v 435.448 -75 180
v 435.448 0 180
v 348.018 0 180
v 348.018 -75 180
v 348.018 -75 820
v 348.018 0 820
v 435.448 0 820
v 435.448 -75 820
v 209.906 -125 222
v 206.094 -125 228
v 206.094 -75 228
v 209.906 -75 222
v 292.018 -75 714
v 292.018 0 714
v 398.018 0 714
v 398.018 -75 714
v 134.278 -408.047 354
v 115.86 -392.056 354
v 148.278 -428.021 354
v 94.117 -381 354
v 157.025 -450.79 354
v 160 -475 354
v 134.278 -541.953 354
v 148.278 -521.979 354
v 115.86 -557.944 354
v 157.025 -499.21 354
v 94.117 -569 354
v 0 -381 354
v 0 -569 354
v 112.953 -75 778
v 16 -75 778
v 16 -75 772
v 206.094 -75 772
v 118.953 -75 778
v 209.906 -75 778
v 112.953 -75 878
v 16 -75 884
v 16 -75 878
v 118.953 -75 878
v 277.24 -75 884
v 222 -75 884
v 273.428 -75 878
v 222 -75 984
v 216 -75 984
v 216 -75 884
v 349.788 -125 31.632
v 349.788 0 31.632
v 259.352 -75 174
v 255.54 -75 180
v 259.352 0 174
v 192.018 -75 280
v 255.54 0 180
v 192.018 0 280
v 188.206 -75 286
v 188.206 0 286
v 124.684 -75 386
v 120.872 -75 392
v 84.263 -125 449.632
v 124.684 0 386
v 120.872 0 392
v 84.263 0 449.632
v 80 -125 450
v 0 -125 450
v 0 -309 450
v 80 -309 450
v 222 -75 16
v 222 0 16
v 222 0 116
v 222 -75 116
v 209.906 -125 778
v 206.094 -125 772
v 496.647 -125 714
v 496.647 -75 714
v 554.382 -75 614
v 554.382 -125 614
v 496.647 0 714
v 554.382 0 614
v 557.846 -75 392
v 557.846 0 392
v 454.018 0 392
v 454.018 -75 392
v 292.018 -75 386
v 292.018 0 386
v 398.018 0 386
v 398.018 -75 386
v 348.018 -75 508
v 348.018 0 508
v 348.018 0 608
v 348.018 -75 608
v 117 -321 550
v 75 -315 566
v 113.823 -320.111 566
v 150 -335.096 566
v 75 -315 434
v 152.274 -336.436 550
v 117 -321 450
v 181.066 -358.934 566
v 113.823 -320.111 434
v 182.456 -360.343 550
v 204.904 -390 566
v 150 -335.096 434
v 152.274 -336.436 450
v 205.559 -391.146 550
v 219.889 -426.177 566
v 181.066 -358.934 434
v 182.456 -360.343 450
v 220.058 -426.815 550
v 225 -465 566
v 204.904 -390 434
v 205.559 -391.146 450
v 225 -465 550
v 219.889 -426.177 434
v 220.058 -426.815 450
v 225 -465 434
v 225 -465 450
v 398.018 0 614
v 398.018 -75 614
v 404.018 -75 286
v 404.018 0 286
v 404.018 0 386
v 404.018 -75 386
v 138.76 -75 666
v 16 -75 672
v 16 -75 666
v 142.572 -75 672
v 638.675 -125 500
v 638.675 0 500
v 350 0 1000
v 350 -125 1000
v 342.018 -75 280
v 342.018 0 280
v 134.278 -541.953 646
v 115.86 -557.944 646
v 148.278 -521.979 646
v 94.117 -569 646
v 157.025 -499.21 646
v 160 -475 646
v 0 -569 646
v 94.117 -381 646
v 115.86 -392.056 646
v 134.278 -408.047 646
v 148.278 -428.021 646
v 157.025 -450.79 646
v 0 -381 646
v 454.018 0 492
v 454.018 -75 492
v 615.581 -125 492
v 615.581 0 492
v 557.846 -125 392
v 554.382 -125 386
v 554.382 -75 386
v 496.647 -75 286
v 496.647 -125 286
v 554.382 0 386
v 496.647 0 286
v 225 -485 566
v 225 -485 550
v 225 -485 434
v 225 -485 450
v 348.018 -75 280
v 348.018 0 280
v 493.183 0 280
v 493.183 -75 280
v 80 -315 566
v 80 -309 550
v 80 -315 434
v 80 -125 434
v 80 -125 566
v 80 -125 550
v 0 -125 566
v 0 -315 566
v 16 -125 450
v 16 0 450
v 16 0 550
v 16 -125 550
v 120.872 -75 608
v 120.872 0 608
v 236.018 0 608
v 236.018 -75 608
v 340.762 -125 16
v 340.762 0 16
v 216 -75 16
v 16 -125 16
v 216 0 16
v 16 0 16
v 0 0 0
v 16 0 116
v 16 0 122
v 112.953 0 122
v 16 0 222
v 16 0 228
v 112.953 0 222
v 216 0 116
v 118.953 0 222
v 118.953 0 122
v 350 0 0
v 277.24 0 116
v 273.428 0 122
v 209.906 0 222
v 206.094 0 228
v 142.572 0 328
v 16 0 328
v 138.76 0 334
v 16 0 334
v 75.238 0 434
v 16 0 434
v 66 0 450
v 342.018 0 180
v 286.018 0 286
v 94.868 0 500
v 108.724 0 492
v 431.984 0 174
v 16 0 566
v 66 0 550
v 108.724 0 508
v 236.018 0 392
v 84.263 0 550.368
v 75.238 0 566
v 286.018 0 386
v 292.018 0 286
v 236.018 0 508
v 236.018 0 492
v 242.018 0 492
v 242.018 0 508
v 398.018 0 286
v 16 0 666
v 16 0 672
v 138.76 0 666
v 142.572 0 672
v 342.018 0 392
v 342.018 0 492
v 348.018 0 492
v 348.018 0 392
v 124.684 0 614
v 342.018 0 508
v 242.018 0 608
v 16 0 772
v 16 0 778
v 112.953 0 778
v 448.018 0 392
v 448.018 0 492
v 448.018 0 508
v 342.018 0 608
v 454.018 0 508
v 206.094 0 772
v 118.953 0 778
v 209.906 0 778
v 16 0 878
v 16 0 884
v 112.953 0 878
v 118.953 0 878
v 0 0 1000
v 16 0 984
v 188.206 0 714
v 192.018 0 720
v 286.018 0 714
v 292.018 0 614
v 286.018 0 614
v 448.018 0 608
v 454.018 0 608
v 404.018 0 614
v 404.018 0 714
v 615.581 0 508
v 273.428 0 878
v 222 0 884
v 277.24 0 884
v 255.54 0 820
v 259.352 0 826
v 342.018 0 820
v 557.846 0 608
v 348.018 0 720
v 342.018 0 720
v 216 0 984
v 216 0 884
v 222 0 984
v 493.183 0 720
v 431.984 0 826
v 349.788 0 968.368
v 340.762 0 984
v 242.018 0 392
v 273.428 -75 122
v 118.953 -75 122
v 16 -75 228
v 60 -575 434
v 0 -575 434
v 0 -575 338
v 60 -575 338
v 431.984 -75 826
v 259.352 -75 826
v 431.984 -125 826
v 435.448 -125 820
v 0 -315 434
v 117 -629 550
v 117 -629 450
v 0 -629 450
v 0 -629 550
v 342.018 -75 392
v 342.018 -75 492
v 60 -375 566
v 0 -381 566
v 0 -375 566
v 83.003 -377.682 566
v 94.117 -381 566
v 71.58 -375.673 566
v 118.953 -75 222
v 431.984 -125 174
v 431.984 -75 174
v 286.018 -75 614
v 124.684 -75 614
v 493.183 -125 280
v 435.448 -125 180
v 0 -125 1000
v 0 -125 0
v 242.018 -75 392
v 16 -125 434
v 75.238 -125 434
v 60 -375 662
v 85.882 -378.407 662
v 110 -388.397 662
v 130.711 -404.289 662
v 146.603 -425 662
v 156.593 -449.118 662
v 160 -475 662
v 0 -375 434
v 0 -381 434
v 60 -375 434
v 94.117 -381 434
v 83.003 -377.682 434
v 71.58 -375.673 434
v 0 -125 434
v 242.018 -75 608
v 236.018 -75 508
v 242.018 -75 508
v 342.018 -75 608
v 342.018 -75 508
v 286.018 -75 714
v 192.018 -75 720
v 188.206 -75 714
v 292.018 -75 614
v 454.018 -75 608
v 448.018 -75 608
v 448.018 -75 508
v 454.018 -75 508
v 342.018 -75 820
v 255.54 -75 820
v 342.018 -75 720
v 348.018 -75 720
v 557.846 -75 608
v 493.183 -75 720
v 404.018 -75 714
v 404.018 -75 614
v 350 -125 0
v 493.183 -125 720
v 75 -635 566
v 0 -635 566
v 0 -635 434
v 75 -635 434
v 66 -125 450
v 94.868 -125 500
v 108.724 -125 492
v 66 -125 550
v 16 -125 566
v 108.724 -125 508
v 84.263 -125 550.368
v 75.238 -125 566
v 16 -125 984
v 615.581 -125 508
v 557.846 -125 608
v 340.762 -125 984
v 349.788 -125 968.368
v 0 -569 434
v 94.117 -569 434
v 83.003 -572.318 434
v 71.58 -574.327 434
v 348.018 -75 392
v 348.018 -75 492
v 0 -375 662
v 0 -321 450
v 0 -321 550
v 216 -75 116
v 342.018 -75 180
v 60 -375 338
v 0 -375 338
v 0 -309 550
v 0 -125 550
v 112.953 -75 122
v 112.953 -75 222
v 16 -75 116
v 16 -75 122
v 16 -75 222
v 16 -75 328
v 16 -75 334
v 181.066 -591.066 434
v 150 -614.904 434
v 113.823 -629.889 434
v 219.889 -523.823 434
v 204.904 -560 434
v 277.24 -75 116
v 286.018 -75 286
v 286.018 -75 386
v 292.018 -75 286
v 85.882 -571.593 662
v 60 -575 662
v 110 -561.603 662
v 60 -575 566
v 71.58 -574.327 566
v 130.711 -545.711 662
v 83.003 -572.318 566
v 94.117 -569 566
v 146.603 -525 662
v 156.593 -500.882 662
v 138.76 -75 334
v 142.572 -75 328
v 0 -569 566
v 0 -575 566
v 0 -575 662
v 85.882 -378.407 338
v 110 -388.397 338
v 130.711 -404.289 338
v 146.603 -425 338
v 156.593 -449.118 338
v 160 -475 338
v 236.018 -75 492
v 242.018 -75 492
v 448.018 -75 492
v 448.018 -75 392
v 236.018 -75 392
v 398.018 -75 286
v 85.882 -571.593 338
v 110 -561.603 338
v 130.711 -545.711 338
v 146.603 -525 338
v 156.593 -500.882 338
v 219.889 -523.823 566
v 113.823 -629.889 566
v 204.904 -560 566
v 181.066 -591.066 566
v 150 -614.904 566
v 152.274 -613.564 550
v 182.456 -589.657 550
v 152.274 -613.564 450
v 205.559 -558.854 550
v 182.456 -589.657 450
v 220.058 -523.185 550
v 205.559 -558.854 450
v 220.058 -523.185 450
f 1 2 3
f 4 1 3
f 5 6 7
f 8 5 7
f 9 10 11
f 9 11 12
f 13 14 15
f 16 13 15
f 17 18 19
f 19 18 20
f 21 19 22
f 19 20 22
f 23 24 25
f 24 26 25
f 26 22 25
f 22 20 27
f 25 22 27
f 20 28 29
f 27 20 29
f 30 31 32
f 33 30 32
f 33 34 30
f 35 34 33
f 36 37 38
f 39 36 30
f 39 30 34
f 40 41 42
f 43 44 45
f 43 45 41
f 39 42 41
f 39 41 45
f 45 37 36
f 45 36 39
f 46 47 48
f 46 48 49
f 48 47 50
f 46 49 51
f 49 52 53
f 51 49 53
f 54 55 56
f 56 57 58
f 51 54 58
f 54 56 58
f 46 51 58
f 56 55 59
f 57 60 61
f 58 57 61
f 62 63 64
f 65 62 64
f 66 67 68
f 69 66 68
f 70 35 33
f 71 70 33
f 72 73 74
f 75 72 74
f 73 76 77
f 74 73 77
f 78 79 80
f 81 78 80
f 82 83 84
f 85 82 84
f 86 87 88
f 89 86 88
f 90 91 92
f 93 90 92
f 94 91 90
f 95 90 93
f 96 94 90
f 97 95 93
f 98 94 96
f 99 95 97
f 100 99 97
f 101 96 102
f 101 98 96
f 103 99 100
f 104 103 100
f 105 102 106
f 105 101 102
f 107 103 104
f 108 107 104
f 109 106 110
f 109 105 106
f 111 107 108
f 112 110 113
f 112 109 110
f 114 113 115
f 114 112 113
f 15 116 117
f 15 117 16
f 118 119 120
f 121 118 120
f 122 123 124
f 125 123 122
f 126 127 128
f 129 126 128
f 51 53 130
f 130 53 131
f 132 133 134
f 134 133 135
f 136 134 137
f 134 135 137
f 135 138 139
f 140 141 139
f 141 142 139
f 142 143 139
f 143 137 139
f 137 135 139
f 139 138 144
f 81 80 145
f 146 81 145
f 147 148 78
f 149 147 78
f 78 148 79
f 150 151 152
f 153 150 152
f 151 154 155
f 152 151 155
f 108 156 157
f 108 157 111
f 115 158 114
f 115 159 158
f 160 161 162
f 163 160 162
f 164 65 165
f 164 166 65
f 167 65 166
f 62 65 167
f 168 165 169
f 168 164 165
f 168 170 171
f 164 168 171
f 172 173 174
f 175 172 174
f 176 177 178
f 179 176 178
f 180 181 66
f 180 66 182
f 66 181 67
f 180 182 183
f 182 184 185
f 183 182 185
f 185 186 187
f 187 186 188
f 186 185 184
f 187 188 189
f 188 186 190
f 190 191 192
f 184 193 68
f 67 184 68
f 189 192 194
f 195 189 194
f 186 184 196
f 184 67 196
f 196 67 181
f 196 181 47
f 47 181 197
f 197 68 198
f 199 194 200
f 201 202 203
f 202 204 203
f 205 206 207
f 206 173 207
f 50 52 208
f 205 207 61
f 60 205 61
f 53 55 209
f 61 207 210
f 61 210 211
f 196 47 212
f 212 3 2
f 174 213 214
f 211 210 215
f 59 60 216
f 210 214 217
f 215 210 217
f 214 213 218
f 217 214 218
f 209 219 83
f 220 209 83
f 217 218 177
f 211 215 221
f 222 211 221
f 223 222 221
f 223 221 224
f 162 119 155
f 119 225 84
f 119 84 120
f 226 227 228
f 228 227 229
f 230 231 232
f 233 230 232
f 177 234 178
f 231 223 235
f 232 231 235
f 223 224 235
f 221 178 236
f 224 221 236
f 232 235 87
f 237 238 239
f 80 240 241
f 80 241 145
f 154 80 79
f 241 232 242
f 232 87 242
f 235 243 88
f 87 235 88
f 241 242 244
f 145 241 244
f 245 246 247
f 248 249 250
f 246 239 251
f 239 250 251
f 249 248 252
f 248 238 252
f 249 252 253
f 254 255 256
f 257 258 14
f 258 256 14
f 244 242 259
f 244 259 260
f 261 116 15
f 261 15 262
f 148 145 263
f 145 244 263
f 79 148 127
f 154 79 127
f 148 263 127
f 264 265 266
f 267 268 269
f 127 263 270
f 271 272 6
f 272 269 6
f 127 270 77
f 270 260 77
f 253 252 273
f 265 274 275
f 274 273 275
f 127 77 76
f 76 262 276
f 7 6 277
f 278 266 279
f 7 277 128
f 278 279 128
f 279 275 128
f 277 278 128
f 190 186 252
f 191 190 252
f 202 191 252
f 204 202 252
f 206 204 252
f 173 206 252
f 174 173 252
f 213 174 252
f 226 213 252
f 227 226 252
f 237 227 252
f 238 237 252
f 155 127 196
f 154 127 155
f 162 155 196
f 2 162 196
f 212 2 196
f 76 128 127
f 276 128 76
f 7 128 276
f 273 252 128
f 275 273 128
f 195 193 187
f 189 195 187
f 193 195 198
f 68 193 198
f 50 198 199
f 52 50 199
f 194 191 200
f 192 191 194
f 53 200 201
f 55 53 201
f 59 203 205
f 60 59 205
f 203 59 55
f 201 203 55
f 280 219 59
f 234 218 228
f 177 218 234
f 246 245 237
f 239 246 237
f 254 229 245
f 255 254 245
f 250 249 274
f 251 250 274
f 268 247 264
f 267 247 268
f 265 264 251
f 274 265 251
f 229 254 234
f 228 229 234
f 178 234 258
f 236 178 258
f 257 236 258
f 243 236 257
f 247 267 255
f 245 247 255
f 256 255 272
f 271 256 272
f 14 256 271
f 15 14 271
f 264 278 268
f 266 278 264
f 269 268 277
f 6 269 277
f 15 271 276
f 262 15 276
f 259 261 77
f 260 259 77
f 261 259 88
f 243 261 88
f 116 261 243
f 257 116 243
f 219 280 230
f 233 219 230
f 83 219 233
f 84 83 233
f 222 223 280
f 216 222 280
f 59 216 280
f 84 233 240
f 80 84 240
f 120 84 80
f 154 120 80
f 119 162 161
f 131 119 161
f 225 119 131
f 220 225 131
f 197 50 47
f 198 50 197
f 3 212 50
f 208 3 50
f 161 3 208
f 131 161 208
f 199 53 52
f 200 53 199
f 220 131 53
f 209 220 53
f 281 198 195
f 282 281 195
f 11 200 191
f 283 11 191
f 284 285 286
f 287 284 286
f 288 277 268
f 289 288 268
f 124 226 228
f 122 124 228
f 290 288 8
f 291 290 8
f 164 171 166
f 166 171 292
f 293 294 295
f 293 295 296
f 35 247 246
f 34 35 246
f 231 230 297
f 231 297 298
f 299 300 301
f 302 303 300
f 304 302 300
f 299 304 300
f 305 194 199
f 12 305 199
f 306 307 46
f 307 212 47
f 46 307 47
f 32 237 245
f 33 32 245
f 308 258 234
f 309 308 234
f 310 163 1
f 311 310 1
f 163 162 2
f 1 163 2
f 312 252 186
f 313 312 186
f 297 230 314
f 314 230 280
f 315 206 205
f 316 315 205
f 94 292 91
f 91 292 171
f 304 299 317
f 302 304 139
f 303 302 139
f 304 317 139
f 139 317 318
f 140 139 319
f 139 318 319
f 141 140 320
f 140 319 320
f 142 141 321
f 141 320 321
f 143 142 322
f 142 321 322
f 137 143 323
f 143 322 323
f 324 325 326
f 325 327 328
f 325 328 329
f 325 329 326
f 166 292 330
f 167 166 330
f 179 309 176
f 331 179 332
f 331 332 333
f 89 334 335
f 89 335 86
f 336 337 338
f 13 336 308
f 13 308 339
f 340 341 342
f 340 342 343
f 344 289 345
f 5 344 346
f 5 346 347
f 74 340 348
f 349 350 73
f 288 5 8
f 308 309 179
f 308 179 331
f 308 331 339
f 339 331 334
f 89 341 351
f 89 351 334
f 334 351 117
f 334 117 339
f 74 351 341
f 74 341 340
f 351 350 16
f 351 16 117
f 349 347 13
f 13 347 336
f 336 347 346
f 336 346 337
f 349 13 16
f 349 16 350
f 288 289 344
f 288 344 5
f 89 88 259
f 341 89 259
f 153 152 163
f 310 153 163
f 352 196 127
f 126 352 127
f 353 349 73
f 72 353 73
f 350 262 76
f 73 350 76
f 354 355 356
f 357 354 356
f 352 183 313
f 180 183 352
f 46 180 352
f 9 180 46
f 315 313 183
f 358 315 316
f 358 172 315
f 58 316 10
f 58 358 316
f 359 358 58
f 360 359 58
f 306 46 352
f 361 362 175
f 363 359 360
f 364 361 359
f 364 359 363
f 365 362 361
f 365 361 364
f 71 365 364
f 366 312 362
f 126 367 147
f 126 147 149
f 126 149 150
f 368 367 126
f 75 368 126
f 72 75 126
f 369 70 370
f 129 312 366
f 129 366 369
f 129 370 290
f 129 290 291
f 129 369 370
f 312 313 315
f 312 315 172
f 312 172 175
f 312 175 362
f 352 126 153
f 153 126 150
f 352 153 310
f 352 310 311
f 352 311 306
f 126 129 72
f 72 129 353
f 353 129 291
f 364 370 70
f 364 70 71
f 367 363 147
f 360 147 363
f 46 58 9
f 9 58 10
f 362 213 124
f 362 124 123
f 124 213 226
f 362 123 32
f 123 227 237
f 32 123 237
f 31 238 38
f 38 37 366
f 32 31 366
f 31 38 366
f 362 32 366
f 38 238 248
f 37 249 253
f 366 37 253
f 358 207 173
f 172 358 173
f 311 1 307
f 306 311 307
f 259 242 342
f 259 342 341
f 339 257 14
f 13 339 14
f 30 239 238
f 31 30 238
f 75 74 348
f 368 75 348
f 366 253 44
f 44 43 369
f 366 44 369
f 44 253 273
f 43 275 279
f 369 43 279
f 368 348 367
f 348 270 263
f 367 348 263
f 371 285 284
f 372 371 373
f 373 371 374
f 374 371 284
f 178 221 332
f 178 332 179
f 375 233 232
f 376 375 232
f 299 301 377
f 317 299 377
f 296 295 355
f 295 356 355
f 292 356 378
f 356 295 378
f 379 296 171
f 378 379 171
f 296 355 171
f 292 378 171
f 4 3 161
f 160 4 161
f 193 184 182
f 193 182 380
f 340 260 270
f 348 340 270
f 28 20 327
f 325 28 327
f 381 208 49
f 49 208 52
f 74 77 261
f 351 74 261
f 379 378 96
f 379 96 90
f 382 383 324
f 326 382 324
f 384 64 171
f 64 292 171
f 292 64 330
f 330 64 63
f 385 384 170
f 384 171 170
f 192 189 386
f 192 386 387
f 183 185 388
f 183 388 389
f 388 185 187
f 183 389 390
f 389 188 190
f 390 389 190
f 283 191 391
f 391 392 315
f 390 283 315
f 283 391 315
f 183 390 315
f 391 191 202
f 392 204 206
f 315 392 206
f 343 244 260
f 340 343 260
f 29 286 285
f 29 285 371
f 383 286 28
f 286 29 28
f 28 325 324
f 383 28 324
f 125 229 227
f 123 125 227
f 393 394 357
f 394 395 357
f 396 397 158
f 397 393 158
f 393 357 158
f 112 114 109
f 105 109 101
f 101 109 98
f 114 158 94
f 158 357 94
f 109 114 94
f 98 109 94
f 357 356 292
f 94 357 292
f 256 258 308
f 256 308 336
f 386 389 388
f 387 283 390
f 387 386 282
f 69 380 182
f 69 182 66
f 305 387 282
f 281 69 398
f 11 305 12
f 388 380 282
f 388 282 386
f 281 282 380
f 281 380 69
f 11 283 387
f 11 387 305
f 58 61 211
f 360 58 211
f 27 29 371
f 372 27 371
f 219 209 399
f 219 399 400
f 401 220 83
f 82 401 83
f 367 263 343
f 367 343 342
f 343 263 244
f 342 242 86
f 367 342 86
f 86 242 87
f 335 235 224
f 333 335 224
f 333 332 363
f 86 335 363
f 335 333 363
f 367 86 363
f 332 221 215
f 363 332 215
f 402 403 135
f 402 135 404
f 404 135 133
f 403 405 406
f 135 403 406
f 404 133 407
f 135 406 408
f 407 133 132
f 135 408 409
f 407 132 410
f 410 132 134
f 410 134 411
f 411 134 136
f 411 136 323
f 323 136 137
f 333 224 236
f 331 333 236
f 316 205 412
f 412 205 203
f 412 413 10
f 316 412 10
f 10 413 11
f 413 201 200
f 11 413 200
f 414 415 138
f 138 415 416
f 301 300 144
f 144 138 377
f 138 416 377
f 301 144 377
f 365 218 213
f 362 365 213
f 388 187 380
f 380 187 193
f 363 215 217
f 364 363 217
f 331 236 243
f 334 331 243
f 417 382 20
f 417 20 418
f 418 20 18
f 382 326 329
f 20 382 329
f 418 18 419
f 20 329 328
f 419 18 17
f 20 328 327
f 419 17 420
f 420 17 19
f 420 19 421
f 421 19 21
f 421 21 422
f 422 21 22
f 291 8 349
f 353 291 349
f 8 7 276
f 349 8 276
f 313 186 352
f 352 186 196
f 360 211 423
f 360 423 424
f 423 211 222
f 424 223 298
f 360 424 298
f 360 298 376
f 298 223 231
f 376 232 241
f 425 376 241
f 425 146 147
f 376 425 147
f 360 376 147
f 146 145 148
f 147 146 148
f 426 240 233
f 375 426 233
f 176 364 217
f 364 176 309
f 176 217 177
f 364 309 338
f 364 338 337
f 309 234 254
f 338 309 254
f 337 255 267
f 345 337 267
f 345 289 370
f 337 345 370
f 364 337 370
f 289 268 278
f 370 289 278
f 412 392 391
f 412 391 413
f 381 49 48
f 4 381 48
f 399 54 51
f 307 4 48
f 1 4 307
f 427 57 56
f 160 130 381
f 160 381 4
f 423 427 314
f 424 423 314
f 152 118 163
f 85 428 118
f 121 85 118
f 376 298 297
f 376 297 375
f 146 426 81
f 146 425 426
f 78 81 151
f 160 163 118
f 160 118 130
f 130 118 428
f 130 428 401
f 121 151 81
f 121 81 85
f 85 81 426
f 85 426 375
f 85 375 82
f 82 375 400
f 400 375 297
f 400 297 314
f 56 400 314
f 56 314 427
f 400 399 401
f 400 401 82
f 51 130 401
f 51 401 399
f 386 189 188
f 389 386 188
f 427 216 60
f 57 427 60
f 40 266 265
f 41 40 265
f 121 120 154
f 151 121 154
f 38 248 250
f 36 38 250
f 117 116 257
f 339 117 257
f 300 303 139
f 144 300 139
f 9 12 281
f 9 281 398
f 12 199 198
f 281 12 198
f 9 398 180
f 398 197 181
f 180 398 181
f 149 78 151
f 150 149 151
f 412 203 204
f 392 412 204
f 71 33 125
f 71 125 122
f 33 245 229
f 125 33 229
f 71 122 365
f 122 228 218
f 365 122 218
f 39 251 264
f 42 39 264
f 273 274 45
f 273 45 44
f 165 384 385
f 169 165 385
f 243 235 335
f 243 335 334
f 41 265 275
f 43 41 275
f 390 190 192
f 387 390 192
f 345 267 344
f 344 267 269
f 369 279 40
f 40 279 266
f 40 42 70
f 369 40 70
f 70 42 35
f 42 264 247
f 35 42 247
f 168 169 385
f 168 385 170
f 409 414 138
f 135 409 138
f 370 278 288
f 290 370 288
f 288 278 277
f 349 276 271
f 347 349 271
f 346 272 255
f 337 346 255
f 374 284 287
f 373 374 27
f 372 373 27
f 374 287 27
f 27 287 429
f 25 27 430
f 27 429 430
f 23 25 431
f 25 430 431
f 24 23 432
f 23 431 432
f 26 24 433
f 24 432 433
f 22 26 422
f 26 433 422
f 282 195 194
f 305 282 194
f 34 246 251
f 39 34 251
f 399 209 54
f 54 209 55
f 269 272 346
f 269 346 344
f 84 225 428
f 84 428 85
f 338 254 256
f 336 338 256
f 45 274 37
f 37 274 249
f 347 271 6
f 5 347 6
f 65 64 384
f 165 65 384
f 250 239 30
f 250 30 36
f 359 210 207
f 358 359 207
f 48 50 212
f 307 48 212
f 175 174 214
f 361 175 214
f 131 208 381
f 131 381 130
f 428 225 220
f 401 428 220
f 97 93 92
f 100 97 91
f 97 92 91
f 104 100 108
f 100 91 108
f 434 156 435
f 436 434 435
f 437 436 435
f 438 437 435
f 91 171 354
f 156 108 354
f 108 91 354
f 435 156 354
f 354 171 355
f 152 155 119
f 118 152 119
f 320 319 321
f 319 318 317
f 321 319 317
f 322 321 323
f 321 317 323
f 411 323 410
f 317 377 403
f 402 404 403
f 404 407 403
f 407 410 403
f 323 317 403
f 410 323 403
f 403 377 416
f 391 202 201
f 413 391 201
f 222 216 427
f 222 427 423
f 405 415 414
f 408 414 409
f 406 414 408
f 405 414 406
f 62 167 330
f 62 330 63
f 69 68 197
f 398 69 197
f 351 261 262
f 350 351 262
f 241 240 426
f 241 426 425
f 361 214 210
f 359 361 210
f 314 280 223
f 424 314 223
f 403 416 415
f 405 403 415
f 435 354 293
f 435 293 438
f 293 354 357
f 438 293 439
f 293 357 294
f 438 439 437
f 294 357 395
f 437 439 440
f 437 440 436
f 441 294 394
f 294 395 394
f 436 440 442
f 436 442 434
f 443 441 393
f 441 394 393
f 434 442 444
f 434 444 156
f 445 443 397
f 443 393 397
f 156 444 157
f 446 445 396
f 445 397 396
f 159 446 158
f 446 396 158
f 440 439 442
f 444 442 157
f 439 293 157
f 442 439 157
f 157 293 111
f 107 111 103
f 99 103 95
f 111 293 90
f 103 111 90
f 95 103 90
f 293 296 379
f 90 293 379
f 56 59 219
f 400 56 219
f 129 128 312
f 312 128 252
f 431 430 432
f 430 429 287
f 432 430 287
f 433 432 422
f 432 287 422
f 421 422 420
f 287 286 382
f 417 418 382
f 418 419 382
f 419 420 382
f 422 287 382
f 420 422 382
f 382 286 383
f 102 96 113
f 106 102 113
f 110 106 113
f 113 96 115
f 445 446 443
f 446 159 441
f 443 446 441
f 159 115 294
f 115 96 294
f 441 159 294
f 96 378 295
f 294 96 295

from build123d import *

# Parameters (mm, degrees)
F2_DEPTH    = 125
F1_W        = 6
F1_H        = 100
F3_DEPTH    = 75
F4_W        = 6
F4_H        = 80
F5_DEPTH    = 160
F4_H_2      = 100
F6_DEPTH    = 80
F7_R        = 99.99999
F7_2_R      = 99.99999
F8_DEPTH    = 225
F9_T1_DEPTH = 882


# Not quite as in the source:
# - a fillet or chamfer that OpenCascade refuses, or shapes differently, is made with other operations: its cross-section is extruded or revolved along the edge and cut away or added
# - a fillet or chamfer is up to 0.001 mm smaller than in the source, because OpenCascade refuses the exact size
# - a feature names something its author has since deleted; it is built from what else it names


with BuildPart() as f2:
    # F1 (on Front) → F2 (new body)
    with BuildSketch(Plane.XZ):
        Polygon((0, 1000), (0, 0), (350, 0), (638.6751345948, 500), (350, 1000), align=None)
        Polygon((16, 884), (16, 984), (216, 984), (222, 984), (340.762395693, 984), (349.7876249334, 968.3678444056), (431.9837382249, 826), (435.4478398401, 820), (493.182866759, 720), (496.6469683742, 714), (554.3819952931, 614), (557.8460969083, 608), (615.5811238272, 508), (620.1999259807, 500), (615.5811238272, 492), (557.8460969083, 392), (554.3819952931, 386), (496.6469683742, 286), (493.182866759, 280), (435.4478398401, 180), (431.9837382249, 174), (349.7876249334, 31.6321555944), (340.762395693, 16), (222, 16), (216, 16), (16, 16), (16, 116), (16, 122), (16, 222), (16, 228), (16, 328), (16, 334), (16, 434), (16, 450), (16, 550), (16, 566), (16, 666), (16, 672), (16, 772), (16, 778), (16, 878), align=None, mode=Mode.SUBTRACT)
        Polygon((236.0177204531, 508), (108.72391992, 508), (113.3427220735, 500), (108.72391992, 492), (236.0177204531, 492), (242.0177204531, 492), (342.0177204531, 492), (348.0177204531, 492), (448.0177204531, 492), (454.0177204531, 492), (615.5811238272, 492), (620.1999259807, 500), (615.5811238272, 508), (454.0177204531, 508), (448.0177204531, 508), (348.0177204531, 508), (342.0177204531, 508), (242.0177204531, 508), align=None)
        Polygon((84.2628335475, 449.6321555944), (75.237604307, 434), (138.7602816721, 334), (142.571642314, 328), (206.094319679, 228), (209.905680321, 222), (273.428357686, 122), (277.2397183279, 116), (340.762395693, 16), (349.7876249334, 31.6321555944), (259.3517584601, 174), (255.5403978182, 180), (192.0177204531, 280), (188.2063598112, 286), (124.6836824461, 386), (120.8723218042, 392), align=None)
        Polygon((349.7876249334, 968.3678444056), (340.762395693, 984), (277.2397183279, 884), (273.428357686, 878), (209.905680321, 778), (206.094319679, 772), (142.571642314, 672), (138.7602816721, 666), (75.237604307, 566), (84.2628335475, 550.3678444056), (120.8723218042, 608), (124.6836824461, 614), (188.2063598112, 714), (192.0177204531, 720), (255.5403978182, 820), (259.3517584601, 826), align=None)
        Polygon((75.237604307, 566), (16, 566), (16, 550), (66, 550), (94.8675134595, 500), (66, 450), (16, 450), (16, 434), (75.237604307, 434), (84.2628335475, 449.6321555944), (108.72391992, 492), (113.3427220735, 500), (108.72391992, 508), (84.2628335475, 550.3678444056), align=None)
    extrude(amount=F2_DEPTH)

    # F1 (on Front) → F3 (join)
    with BuildSketch(Plane.XZ):
        Polygon((112.9528401605, 122), (16, 122), (16, 116), (216, 116), (222, 116), (277.2397183279, 116), (273.428357686, 122), (118.9528401605, 122), align=None)
        with Locations((219, 66)):
            Rectangle(F1_W, F1_H)
        with Locations((115.9528401605, 172)):
            Rectangle(F1_W, F1_H)
        Polygon((206.094319679, 228), (16, 228), (16, 222), (112.9528401605, 222), (118.9528401605, 222), (209.905680321, 222), align=None)
        Polygon((138.7602816721, 334), (16, 334), (16, 328), (142.571642314, 328), align=None)
        Polygon((342.0177204531, 180), (255.5403978182, 180), (259.3517584601, 174), (431.9837382249, 174), (435.4478398401, 180), (348.0177204531, 180), align=None)
        with Locations((345.0177204531, 230)):
            Rectangle(F1_W, F1_H)
        Polygon((286.0177204531, 286), (188.2063598112, 286), (192.0177204531, 280), (342.0177204531, 280), (348.0177204531, 280), (493.182866759, 280), (496.6469683742, 286), (404.0177204531, 286), (398.0177204531, 286), (292.0177204531, 286), align=None)
        with Locations((289.0177204531, 336)):
            Rectangle(F1_W, F1_H)
        with Locations((401.0177204531, 336)):
            Rectangle(F1_W, F1_H)
        Polygon((236.0177204531, 392), (120.8723218042, 392), (124.6836824461, 386), (286.0177204531, 386), (292.0177204531, 386), (398.0177204531, 386), (404.0177204531, 386), (554.3819952931, 386), (557.8460969083, 392), (454.0177204531, 392), (448.0177204531, 392), (348.0177204531, 392), (342.0177204531, 392), (242.0177204531, 392), align=None)
        with Locations((345.0177204531, 442)):
            Rectangle(F1_W, F1_H)
        with Locations((239.0177204531, 442)):
            Rectangle(F1_W, F1_H)
        with Locations((451.0177204531, 442)):
            Rectangle(F1_W, F1_H)
        with Locations((401.0177204531, 664)):
            Rectangle(F1_W, F1_H)
        Polygon((496.6469683742, 714), (493.182866759, 720), (348.0177204531, 720), (342.0177204531, 720), (192.0177204531, 720), (188.2063598112, 714), (286.0177204531, 714), (292.0177204531, 714), (398.0177204531, 714), (404.0177204531, 714), align=None)
        with Locations((345.0177204531, 770)):
            Rectangle(F1_W, F1_H)
        Polygon((557.8460969083, 608), (554.3819952931, 614), (404.0177204531, 614), (398.0177204531, 614), (292.0177204531, 614), (286.0177204531, 614), (124.6836824461, 614), (120.8723218042, 608), (236.0177204531, 608), (242.0177204531, 608), (342.0177204531, 608), (348.0177204531, 608), (448.0177204531, 608), (454.0177204531, 608), align=None)
        with Locations((451.0177204531, 558)):
            Rectangle(F1_W, F1_H)
        with Locations((239.0177204531, 558)):
            Rectangle(F1_W, F1_H)
        with Locations((345.0177204531, 558)):
            Rectangle(F1_W, F1_H)
        Polygon((142.571642314, 672), (16, 672), (16, 666), (138.7602816721, 666), align=None)
        Polygon((112.9528401605, 778), (16, 778), (16, 772), (206.094319679, 772), (209.905680321, 778), (118.9528401605, 778), align=None)
        with Locations((115.9528401605, 828)):
            Rectangle(F1_W, F1_H)
        Polygon((216, 884), (16, 884), (16, 878), (112.9528401605, 878), (118.9528401605, 878), (273.428357686, 878), (277.2397183279, 884), (222, 884), align=None)
        with Locations((219, 934)):
            Rectangle(F1_W, F1_H)
        Polygon((435.4478398401, 820), (431.9837382249, 826), (259.3517584601, 826), (255.5403978182, 820), (342.0177204531, 820), (348.0177204531, 820), align=None)
        with Locations((289.0177204531, 664)):
            Rectangle(F1_W, F1_H)
    extrude(amount=F3_DEPTH)


with BuildPart() as f5:
    # F4 (on Right) → F5 (new body)
    with BuildSketch(Plane.YZ):
        Polygon((-381, 646), (-375, 646), (-375, 662), (-575, 662), (-575, 646), (-569, 646), align=None)
        with Locations((-572, 606)):
            Rectangle(F4_W, F4_H)
        with Locations((-378, 606)):
            Rectangle(F4_W, F4_H)
    extrude(amount=F5_DEPTH)

    # F7 (radius 100 in the source; OpenCascade refuses exactly that, so slightly less here)
    f7_edges = [f5.edges().sort_by_distance(p)[0] for p in [
        (160, -375, 614),
        (160, -575, 614),
    ]]
    fillet(f7_edges, radius=F7_R)


with BuildPart() as f5b:
    # F4 (on Right) → F5, piece 2 (new body)
    with BuildSketch(Plane.YZ):
        Polygon((-375, 338), (-375, 354), (-381, 354), (-569, 354), (-575, 354), (-575, 338), align=None)
        with Locations((-378, 394)):
            Rectangle(F4_W, F4_H)
        with Locations((-572, 394)):
            Rectangle(F4_W, F4_H)
    extrude(amount=F5_DEPTH)

    # F7#2 (radius 100 in the source; OpenCascade refuses exactly that, so slightly less here)
    f7_2_edges = [f5b.edges().sort_by_distance(p)[0] for p in [
        (160, -375, 386),
        (160, -575, 386),
    ]]
    fillet(f7_2_edges, radius=F7_2_R)


with BuildPart() as f6:
    # F4 (on Right) → F6 (new body)
    with BuildSketch(Plane.YZ):
        with Locations((-312, 500)):
            Rectangle(F4_W, F4_H_2)
        Polygon((-309, 550), (-125, 550), (-125, 566), (-315, 566), (-315, 550), align=None)
        Polygon((-125, 450), (-309, 450), (-315, 450), (-315, 434), (-125, 434), align=None)
    extrude(amount=F6_DEPTH)


with BuildPart() as f8:
    # F4 (on Right) → F8 (new body)
    with BuildSketch(Plane.YZ):
        Polygon((-321, 550), (-315, 550), (-315, 566), (-375, 566), (-381, 566), (-569, 566), (-575, 566), (-635, 566), (-635, 550), (-629, 550), align=None)
        with Locations((-632, 500)):
            Rectangle(F4_W, F4_H_2)
        Polygon((-315, 434), (-315, 450), (-321, 450), (-629, 450), (-635, 450), (-635, 434), (-575, 434), (-569, 434), (-381, 434), (-375, 434), align=None)
        with Locations((-318, 500)):
            Rectangle(F4_W, F4_H_2)
    extrude(amount=F8_DEPTH)

    # F9: fillet of radius 150 on 2 edges, made by hand

    # F9_s2 → F9_t1 (cut)
    with BuildSketch(Plane.XY.offset(59)):
        with BuildLine():
            ThreePointArc((75, -635), (181.066017178, -591.066017178), (225, -485))
            Line((225, -485), (225, -635))
            Line((225, -635), (75, -635))
        make_face()
        with BuildLine():
            ThreePointArc((75, -315), (181.066017178, -358.933982822), (225, -465))
            Line((225, -465), (225, -315))
            Line((225, -315), (75, -315))
        make_face()
    extrude(amount=F9_T1_DEPTH, mode=Mode.SUBTRACT)


solid = Compound([f2.part, f5.part, f5b.part, f6.part, f8.part])
